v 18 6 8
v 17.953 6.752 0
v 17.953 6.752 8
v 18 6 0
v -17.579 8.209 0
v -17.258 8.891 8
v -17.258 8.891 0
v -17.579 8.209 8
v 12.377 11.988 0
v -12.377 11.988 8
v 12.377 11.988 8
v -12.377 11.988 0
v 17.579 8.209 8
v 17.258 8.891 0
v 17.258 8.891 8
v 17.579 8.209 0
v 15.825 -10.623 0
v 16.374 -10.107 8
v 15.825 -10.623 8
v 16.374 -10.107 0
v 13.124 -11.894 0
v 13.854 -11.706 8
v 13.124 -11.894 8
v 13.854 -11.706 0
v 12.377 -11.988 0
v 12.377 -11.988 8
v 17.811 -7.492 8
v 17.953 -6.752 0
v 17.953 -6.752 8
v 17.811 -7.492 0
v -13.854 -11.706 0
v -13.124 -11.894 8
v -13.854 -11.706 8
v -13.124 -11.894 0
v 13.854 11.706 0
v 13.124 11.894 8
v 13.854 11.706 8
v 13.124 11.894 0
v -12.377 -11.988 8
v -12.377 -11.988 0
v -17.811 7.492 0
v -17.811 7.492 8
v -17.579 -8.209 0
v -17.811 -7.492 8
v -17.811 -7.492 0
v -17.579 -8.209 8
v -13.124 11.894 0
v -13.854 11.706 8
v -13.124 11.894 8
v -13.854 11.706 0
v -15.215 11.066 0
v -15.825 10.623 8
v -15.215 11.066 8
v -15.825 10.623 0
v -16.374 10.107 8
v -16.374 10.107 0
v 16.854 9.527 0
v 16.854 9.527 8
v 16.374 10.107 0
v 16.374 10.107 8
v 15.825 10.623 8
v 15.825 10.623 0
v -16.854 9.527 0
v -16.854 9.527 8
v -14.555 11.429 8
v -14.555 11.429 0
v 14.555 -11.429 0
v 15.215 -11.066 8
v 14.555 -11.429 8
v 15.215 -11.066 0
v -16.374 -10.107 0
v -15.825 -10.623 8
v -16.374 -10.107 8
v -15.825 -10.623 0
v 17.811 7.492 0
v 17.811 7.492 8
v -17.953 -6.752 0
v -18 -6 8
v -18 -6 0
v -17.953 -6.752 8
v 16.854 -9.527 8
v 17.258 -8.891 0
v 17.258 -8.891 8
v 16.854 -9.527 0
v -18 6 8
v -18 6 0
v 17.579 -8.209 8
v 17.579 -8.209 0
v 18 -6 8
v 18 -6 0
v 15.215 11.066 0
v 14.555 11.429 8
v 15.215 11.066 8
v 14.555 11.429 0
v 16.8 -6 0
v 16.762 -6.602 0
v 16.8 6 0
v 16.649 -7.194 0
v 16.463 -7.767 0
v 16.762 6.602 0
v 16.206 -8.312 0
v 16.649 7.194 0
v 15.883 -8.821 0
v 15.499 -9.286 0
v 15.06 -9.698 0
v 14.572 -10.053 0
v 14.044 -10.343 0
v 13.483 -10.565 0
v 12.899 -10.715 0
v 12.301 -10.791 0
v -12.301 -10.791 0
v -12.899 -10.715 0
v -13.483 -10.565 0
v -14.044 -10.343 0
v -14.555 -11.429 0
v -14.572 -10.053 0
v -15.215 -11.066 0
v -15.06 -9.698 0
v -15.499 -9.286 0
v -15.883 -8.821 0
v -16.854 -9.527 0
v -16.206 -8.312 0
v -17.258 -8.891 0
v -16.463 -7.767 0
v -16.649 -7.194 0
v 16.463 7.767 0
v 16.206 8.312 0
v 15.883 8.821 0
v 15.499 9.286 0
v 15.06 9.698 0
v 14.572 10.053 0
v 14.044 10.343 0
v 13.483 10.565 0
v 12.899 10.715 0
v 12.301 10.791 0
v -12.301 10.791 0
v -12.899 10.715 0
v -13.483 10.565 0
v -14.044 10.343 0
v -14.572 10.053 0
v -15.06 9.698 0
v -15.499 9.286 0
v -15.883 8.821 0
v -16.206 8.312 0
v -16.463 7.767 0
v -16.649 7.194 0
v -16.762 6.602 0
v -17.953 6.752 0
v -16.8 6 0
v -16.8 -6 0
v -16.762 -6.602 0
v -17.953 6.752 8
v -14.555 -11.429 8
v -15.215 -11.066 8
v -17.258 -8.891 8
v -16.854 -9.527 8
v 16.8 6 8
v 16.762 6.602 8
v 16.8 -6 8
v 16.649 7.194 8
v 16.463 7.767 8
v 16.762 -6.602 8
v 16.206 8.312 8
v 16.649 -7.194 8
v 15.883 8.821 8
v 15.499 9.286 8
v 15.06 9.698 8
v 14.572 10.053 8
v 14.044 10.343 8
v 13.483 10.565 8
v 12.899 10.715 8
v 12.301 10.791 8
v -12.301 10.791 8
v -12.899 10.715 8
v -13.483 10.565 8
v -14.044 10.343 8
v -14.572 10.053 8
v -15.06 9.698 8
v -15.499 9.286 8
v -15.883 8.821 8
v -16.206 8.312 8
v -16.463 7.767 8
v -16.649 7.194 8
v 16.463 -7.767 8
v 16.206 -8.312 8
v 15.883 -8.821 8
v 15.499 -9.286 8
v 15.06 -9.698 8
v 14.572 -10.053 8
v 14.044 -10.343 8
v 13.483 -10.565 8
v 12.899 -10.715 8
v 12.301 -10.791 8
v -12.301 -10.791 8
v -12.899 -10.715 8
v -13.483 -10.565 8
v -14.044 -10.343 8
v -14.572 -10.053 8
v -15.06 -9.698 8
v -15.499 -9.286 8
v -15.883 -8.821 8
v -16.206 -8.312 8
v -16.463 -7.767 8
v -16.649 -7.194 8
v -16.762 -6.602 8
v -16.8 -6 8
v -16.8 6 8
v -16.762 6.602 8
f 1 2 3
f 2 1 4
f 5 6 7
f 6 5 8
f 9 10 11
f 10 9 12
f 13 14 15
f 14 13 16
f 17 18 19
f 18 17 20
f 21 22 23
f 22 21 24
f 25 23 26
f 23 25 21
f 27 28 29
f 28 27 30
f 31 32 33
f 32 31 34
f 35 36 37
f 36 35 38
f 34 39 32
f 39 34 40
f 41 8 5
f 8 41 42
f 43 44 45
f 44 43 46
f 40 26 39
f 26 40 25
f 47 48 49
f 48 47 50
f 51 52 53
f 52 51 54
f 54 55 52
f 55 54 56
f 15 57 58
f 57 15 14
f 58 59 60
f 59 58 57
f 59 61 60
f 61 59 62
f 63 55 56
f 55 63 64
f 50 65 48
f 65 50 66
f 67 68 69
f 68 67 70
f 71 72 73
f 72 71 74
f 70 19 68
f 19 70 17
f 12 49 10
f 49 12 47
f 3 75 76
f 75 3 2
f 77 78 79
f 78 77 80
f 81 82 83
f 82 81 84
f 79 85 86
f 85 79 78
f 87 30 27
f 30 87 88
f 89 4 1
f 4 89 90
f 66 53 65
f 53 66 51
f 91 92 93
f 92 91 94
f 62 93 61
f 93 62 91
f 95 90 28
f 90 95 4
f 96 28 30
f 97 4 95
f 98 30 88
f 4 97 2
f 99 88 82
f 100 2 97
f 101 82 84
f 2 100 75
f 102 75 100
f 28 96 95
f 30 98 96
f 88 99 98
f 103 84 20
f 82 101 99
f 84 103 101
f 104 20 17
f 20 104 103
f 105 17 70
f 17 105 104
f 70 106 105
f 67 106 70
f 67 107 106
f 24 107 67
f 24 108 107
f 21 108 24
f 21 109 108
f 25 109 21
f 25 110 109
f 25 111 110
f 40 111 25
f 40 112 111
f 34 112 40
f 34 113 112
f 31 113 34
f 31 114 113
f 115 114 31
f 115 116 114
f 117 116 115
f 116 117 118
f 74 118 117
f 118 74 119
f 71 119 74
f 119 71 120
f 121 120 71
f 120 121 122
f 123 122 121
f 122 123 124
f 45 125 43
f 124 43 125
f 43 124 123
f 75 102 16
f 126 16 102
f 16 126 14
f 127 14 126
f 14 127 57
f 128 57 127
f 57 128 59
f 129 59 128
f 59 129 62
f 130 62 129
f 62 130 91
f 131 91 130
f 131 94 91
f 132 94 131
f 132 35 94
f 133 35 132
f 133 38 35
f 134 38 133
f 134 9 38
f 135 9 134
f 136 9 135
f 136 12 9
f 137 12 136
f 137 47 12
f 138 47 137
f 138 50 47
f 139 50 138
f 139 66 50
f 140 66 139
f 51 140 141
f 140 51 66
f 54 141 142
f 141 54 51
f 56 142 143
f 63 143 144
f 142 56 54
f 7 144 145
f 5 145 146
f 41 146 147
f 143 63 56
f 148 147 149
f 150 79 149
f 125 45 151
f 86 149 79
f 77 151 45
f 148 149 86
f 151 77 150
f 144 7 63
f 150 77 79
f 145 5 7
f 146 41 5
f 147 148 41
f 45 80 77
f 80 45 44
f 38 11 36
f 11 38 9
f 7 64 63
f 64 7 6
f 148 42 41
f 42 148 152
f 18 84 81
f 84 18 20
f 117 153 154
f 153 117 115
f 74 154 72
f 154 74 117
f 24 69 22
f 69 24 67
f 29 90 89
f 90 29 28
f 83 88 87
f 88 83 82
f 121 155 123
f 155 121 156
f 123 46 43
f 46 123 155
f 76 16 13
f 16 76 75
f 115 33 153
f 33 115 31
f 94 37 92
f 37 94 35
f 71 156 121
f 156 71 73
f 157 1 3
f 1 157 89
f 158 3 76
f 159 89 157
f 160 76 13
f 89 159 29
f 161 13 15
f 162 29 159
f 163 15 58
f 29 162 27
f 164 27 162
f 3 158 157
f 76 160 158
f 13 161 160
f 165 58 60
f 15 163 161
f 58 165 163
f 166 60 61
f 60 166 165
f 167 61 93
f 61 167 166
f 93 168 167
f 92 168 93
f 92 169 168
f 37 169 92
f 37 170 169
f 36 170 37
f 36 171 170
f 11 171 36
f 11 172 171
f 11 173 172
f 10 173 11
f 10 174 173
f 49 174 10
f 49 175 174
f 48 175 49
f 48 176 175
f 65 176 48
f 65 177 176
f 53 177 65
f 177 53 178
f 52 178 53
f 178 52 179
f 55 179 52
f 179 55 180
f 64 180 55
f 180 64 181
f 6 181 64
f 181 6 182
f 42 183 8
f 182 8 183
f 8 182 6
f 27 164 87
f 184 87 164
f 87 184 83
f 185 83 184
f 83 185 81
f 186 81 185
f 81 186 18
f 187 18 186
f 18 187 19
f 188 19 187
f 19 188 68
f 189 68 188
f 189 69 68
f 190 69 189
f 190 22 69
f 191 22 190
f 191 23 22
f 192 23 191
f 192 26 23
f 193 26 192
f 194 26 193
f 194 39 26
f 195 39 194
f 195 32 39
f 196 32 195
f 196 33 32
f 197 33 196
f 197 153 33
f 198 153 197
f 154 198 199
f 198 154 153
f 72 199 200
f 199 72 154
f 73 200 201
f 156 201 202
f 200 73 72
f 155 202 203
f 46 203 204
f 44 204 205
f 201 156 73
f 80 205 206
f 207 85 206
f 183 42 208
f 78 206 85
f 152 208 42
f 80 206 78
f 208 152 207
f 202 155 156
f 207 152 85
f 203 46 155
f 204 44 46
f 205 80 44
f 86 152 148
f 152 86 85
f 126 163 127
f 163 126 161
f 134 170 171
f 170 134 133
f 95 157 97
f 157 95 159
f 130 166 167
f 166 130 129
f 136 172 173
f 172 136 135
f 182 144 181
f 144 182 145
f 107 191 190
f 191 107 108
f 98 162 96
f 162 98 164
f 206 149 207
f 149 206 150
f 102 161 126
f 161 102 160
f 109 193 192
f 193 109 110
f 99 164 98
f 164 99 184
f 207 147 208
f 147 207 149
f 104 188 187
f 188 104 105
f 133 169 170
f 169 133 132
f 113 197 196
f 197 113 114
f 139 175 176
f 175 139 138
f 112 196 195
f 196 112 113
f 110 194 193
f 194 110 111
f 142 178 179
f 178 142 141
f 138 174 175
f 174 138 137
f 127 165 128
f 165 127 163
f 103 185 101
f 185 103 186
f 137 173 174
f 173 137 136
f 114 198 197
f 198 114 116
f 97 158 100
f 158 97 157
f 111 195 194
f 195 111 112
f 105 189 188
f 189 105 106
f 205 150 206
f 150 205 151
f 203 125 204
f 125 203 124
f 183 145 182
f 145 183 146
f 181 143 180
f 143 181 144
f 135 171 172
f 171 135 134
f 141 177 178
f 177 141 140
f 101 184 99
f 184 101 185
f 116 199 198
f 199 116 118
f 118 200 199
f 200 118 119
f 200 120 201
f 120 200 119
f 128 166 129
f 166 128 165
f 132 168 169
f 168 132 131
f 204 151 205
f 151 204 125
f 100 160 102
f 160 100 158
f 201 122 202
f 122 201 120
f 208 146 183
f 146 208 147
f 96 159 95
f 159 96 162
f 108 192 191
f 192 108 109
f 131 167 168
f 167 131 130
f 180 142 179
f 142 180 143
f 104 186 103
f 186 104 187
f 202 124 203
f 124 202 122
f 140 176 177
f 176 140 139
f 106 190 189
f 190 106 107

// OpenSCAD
$fn = 50;

difference() {
	union() {
		translate(v = [0, 0, 0]) {
			rotate(a = [0, 0, 0]) {
				difference() {
					union() {
						hull() {
							translate(v = [-12.0, 6.0, 0]) {
								cylinder(h = 8, r = 6);
							}
							translate(v = [12.0, 6.0, 0]) {
								cylinder(h = 8, r = 6);
							}
							translate(v = [-12.0, -6.0, 0]) {
								cylinder(h = 8, r = 6);
							}
							translate(v = [12.0, -6.0, 0]) {
								cylinder(h = 8, r = 6);
							}
						}
					}
					union() {
						hull() {
							translate(v = [-12.0, 6.000000000000001, 0]) {
								cylinder(h = 8, r = 4.8);
							}
							translate(v = [12.0, 6.000000000000001, 0]) {
								cylinder(h = 8, r = 4.8);
							}
							translate(v = [-12.0, -6.000000000000001, 0]) {
								cylinder(h = 8, r = 4.8);
							}
							translate(v = [12.0, -6.000000000000001, 0]) {
								cylinder(h = 8, r = 4.8);
							}
						}
					}
				}
			}
		}
	}
	union();
}
